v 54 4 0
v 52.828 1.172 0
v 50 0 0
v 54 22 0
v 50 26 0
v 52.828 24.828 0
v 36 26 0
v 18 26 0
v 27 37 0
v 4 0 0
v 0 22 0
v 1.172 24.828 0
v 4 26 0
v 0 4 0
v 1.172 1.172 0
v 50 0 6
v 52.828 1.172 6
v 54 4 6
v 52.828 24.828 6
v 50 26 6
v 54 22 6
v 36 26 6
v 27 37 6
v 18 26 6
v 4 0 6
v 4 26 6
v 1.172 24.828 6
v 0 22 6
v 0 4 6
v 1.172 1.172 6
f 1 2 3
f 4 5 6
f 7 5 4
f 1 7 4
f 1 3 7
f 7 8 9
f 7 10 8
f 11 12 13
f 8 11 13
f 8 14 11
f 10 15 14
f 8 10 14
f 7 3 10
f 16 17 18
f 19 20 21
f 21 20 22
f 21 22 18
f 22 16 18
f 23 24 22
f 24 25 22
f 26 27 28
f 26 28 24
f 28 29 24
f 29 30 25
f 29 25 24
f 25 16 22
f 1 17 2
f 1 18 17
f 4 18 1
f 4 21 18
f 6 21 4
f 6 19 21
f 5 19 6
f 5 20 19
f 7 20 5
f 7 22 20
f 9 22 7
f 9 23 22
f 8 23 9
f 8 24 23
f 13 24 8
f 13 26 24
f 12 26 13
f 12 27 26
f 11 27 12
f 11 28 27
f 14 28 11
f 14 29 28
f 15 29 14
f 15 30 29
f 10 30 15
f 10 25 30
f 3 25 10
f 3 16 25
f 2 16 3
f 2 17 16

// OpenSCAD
$fn = 32;

// ----------------------------------------------------------------------
// Ratchet pawl: 54 x 26 mm body, beak 11 mm сверху
// ----------------------------------------------------------------------

// --- parameters (mm) ---
profile_height = 6;       // extrusion height
profile_points = 15;      // points of the closed outline

profile = [[0, 4], [1.172, 1.172], [4, 0], [50, 0], [52.828, 1.172], [54, 4], [54, 22], [52.828, 24.828], [50, 26], [36, 26], [27, 37], [18, 26], [4, 26], [1.172, 24.828], [0, 22]];  // single closed polygon, 15 points, counter clockwise

// --- the one profile operation ---
linear_extrude(height = profile_height) polygon(points = profile);
